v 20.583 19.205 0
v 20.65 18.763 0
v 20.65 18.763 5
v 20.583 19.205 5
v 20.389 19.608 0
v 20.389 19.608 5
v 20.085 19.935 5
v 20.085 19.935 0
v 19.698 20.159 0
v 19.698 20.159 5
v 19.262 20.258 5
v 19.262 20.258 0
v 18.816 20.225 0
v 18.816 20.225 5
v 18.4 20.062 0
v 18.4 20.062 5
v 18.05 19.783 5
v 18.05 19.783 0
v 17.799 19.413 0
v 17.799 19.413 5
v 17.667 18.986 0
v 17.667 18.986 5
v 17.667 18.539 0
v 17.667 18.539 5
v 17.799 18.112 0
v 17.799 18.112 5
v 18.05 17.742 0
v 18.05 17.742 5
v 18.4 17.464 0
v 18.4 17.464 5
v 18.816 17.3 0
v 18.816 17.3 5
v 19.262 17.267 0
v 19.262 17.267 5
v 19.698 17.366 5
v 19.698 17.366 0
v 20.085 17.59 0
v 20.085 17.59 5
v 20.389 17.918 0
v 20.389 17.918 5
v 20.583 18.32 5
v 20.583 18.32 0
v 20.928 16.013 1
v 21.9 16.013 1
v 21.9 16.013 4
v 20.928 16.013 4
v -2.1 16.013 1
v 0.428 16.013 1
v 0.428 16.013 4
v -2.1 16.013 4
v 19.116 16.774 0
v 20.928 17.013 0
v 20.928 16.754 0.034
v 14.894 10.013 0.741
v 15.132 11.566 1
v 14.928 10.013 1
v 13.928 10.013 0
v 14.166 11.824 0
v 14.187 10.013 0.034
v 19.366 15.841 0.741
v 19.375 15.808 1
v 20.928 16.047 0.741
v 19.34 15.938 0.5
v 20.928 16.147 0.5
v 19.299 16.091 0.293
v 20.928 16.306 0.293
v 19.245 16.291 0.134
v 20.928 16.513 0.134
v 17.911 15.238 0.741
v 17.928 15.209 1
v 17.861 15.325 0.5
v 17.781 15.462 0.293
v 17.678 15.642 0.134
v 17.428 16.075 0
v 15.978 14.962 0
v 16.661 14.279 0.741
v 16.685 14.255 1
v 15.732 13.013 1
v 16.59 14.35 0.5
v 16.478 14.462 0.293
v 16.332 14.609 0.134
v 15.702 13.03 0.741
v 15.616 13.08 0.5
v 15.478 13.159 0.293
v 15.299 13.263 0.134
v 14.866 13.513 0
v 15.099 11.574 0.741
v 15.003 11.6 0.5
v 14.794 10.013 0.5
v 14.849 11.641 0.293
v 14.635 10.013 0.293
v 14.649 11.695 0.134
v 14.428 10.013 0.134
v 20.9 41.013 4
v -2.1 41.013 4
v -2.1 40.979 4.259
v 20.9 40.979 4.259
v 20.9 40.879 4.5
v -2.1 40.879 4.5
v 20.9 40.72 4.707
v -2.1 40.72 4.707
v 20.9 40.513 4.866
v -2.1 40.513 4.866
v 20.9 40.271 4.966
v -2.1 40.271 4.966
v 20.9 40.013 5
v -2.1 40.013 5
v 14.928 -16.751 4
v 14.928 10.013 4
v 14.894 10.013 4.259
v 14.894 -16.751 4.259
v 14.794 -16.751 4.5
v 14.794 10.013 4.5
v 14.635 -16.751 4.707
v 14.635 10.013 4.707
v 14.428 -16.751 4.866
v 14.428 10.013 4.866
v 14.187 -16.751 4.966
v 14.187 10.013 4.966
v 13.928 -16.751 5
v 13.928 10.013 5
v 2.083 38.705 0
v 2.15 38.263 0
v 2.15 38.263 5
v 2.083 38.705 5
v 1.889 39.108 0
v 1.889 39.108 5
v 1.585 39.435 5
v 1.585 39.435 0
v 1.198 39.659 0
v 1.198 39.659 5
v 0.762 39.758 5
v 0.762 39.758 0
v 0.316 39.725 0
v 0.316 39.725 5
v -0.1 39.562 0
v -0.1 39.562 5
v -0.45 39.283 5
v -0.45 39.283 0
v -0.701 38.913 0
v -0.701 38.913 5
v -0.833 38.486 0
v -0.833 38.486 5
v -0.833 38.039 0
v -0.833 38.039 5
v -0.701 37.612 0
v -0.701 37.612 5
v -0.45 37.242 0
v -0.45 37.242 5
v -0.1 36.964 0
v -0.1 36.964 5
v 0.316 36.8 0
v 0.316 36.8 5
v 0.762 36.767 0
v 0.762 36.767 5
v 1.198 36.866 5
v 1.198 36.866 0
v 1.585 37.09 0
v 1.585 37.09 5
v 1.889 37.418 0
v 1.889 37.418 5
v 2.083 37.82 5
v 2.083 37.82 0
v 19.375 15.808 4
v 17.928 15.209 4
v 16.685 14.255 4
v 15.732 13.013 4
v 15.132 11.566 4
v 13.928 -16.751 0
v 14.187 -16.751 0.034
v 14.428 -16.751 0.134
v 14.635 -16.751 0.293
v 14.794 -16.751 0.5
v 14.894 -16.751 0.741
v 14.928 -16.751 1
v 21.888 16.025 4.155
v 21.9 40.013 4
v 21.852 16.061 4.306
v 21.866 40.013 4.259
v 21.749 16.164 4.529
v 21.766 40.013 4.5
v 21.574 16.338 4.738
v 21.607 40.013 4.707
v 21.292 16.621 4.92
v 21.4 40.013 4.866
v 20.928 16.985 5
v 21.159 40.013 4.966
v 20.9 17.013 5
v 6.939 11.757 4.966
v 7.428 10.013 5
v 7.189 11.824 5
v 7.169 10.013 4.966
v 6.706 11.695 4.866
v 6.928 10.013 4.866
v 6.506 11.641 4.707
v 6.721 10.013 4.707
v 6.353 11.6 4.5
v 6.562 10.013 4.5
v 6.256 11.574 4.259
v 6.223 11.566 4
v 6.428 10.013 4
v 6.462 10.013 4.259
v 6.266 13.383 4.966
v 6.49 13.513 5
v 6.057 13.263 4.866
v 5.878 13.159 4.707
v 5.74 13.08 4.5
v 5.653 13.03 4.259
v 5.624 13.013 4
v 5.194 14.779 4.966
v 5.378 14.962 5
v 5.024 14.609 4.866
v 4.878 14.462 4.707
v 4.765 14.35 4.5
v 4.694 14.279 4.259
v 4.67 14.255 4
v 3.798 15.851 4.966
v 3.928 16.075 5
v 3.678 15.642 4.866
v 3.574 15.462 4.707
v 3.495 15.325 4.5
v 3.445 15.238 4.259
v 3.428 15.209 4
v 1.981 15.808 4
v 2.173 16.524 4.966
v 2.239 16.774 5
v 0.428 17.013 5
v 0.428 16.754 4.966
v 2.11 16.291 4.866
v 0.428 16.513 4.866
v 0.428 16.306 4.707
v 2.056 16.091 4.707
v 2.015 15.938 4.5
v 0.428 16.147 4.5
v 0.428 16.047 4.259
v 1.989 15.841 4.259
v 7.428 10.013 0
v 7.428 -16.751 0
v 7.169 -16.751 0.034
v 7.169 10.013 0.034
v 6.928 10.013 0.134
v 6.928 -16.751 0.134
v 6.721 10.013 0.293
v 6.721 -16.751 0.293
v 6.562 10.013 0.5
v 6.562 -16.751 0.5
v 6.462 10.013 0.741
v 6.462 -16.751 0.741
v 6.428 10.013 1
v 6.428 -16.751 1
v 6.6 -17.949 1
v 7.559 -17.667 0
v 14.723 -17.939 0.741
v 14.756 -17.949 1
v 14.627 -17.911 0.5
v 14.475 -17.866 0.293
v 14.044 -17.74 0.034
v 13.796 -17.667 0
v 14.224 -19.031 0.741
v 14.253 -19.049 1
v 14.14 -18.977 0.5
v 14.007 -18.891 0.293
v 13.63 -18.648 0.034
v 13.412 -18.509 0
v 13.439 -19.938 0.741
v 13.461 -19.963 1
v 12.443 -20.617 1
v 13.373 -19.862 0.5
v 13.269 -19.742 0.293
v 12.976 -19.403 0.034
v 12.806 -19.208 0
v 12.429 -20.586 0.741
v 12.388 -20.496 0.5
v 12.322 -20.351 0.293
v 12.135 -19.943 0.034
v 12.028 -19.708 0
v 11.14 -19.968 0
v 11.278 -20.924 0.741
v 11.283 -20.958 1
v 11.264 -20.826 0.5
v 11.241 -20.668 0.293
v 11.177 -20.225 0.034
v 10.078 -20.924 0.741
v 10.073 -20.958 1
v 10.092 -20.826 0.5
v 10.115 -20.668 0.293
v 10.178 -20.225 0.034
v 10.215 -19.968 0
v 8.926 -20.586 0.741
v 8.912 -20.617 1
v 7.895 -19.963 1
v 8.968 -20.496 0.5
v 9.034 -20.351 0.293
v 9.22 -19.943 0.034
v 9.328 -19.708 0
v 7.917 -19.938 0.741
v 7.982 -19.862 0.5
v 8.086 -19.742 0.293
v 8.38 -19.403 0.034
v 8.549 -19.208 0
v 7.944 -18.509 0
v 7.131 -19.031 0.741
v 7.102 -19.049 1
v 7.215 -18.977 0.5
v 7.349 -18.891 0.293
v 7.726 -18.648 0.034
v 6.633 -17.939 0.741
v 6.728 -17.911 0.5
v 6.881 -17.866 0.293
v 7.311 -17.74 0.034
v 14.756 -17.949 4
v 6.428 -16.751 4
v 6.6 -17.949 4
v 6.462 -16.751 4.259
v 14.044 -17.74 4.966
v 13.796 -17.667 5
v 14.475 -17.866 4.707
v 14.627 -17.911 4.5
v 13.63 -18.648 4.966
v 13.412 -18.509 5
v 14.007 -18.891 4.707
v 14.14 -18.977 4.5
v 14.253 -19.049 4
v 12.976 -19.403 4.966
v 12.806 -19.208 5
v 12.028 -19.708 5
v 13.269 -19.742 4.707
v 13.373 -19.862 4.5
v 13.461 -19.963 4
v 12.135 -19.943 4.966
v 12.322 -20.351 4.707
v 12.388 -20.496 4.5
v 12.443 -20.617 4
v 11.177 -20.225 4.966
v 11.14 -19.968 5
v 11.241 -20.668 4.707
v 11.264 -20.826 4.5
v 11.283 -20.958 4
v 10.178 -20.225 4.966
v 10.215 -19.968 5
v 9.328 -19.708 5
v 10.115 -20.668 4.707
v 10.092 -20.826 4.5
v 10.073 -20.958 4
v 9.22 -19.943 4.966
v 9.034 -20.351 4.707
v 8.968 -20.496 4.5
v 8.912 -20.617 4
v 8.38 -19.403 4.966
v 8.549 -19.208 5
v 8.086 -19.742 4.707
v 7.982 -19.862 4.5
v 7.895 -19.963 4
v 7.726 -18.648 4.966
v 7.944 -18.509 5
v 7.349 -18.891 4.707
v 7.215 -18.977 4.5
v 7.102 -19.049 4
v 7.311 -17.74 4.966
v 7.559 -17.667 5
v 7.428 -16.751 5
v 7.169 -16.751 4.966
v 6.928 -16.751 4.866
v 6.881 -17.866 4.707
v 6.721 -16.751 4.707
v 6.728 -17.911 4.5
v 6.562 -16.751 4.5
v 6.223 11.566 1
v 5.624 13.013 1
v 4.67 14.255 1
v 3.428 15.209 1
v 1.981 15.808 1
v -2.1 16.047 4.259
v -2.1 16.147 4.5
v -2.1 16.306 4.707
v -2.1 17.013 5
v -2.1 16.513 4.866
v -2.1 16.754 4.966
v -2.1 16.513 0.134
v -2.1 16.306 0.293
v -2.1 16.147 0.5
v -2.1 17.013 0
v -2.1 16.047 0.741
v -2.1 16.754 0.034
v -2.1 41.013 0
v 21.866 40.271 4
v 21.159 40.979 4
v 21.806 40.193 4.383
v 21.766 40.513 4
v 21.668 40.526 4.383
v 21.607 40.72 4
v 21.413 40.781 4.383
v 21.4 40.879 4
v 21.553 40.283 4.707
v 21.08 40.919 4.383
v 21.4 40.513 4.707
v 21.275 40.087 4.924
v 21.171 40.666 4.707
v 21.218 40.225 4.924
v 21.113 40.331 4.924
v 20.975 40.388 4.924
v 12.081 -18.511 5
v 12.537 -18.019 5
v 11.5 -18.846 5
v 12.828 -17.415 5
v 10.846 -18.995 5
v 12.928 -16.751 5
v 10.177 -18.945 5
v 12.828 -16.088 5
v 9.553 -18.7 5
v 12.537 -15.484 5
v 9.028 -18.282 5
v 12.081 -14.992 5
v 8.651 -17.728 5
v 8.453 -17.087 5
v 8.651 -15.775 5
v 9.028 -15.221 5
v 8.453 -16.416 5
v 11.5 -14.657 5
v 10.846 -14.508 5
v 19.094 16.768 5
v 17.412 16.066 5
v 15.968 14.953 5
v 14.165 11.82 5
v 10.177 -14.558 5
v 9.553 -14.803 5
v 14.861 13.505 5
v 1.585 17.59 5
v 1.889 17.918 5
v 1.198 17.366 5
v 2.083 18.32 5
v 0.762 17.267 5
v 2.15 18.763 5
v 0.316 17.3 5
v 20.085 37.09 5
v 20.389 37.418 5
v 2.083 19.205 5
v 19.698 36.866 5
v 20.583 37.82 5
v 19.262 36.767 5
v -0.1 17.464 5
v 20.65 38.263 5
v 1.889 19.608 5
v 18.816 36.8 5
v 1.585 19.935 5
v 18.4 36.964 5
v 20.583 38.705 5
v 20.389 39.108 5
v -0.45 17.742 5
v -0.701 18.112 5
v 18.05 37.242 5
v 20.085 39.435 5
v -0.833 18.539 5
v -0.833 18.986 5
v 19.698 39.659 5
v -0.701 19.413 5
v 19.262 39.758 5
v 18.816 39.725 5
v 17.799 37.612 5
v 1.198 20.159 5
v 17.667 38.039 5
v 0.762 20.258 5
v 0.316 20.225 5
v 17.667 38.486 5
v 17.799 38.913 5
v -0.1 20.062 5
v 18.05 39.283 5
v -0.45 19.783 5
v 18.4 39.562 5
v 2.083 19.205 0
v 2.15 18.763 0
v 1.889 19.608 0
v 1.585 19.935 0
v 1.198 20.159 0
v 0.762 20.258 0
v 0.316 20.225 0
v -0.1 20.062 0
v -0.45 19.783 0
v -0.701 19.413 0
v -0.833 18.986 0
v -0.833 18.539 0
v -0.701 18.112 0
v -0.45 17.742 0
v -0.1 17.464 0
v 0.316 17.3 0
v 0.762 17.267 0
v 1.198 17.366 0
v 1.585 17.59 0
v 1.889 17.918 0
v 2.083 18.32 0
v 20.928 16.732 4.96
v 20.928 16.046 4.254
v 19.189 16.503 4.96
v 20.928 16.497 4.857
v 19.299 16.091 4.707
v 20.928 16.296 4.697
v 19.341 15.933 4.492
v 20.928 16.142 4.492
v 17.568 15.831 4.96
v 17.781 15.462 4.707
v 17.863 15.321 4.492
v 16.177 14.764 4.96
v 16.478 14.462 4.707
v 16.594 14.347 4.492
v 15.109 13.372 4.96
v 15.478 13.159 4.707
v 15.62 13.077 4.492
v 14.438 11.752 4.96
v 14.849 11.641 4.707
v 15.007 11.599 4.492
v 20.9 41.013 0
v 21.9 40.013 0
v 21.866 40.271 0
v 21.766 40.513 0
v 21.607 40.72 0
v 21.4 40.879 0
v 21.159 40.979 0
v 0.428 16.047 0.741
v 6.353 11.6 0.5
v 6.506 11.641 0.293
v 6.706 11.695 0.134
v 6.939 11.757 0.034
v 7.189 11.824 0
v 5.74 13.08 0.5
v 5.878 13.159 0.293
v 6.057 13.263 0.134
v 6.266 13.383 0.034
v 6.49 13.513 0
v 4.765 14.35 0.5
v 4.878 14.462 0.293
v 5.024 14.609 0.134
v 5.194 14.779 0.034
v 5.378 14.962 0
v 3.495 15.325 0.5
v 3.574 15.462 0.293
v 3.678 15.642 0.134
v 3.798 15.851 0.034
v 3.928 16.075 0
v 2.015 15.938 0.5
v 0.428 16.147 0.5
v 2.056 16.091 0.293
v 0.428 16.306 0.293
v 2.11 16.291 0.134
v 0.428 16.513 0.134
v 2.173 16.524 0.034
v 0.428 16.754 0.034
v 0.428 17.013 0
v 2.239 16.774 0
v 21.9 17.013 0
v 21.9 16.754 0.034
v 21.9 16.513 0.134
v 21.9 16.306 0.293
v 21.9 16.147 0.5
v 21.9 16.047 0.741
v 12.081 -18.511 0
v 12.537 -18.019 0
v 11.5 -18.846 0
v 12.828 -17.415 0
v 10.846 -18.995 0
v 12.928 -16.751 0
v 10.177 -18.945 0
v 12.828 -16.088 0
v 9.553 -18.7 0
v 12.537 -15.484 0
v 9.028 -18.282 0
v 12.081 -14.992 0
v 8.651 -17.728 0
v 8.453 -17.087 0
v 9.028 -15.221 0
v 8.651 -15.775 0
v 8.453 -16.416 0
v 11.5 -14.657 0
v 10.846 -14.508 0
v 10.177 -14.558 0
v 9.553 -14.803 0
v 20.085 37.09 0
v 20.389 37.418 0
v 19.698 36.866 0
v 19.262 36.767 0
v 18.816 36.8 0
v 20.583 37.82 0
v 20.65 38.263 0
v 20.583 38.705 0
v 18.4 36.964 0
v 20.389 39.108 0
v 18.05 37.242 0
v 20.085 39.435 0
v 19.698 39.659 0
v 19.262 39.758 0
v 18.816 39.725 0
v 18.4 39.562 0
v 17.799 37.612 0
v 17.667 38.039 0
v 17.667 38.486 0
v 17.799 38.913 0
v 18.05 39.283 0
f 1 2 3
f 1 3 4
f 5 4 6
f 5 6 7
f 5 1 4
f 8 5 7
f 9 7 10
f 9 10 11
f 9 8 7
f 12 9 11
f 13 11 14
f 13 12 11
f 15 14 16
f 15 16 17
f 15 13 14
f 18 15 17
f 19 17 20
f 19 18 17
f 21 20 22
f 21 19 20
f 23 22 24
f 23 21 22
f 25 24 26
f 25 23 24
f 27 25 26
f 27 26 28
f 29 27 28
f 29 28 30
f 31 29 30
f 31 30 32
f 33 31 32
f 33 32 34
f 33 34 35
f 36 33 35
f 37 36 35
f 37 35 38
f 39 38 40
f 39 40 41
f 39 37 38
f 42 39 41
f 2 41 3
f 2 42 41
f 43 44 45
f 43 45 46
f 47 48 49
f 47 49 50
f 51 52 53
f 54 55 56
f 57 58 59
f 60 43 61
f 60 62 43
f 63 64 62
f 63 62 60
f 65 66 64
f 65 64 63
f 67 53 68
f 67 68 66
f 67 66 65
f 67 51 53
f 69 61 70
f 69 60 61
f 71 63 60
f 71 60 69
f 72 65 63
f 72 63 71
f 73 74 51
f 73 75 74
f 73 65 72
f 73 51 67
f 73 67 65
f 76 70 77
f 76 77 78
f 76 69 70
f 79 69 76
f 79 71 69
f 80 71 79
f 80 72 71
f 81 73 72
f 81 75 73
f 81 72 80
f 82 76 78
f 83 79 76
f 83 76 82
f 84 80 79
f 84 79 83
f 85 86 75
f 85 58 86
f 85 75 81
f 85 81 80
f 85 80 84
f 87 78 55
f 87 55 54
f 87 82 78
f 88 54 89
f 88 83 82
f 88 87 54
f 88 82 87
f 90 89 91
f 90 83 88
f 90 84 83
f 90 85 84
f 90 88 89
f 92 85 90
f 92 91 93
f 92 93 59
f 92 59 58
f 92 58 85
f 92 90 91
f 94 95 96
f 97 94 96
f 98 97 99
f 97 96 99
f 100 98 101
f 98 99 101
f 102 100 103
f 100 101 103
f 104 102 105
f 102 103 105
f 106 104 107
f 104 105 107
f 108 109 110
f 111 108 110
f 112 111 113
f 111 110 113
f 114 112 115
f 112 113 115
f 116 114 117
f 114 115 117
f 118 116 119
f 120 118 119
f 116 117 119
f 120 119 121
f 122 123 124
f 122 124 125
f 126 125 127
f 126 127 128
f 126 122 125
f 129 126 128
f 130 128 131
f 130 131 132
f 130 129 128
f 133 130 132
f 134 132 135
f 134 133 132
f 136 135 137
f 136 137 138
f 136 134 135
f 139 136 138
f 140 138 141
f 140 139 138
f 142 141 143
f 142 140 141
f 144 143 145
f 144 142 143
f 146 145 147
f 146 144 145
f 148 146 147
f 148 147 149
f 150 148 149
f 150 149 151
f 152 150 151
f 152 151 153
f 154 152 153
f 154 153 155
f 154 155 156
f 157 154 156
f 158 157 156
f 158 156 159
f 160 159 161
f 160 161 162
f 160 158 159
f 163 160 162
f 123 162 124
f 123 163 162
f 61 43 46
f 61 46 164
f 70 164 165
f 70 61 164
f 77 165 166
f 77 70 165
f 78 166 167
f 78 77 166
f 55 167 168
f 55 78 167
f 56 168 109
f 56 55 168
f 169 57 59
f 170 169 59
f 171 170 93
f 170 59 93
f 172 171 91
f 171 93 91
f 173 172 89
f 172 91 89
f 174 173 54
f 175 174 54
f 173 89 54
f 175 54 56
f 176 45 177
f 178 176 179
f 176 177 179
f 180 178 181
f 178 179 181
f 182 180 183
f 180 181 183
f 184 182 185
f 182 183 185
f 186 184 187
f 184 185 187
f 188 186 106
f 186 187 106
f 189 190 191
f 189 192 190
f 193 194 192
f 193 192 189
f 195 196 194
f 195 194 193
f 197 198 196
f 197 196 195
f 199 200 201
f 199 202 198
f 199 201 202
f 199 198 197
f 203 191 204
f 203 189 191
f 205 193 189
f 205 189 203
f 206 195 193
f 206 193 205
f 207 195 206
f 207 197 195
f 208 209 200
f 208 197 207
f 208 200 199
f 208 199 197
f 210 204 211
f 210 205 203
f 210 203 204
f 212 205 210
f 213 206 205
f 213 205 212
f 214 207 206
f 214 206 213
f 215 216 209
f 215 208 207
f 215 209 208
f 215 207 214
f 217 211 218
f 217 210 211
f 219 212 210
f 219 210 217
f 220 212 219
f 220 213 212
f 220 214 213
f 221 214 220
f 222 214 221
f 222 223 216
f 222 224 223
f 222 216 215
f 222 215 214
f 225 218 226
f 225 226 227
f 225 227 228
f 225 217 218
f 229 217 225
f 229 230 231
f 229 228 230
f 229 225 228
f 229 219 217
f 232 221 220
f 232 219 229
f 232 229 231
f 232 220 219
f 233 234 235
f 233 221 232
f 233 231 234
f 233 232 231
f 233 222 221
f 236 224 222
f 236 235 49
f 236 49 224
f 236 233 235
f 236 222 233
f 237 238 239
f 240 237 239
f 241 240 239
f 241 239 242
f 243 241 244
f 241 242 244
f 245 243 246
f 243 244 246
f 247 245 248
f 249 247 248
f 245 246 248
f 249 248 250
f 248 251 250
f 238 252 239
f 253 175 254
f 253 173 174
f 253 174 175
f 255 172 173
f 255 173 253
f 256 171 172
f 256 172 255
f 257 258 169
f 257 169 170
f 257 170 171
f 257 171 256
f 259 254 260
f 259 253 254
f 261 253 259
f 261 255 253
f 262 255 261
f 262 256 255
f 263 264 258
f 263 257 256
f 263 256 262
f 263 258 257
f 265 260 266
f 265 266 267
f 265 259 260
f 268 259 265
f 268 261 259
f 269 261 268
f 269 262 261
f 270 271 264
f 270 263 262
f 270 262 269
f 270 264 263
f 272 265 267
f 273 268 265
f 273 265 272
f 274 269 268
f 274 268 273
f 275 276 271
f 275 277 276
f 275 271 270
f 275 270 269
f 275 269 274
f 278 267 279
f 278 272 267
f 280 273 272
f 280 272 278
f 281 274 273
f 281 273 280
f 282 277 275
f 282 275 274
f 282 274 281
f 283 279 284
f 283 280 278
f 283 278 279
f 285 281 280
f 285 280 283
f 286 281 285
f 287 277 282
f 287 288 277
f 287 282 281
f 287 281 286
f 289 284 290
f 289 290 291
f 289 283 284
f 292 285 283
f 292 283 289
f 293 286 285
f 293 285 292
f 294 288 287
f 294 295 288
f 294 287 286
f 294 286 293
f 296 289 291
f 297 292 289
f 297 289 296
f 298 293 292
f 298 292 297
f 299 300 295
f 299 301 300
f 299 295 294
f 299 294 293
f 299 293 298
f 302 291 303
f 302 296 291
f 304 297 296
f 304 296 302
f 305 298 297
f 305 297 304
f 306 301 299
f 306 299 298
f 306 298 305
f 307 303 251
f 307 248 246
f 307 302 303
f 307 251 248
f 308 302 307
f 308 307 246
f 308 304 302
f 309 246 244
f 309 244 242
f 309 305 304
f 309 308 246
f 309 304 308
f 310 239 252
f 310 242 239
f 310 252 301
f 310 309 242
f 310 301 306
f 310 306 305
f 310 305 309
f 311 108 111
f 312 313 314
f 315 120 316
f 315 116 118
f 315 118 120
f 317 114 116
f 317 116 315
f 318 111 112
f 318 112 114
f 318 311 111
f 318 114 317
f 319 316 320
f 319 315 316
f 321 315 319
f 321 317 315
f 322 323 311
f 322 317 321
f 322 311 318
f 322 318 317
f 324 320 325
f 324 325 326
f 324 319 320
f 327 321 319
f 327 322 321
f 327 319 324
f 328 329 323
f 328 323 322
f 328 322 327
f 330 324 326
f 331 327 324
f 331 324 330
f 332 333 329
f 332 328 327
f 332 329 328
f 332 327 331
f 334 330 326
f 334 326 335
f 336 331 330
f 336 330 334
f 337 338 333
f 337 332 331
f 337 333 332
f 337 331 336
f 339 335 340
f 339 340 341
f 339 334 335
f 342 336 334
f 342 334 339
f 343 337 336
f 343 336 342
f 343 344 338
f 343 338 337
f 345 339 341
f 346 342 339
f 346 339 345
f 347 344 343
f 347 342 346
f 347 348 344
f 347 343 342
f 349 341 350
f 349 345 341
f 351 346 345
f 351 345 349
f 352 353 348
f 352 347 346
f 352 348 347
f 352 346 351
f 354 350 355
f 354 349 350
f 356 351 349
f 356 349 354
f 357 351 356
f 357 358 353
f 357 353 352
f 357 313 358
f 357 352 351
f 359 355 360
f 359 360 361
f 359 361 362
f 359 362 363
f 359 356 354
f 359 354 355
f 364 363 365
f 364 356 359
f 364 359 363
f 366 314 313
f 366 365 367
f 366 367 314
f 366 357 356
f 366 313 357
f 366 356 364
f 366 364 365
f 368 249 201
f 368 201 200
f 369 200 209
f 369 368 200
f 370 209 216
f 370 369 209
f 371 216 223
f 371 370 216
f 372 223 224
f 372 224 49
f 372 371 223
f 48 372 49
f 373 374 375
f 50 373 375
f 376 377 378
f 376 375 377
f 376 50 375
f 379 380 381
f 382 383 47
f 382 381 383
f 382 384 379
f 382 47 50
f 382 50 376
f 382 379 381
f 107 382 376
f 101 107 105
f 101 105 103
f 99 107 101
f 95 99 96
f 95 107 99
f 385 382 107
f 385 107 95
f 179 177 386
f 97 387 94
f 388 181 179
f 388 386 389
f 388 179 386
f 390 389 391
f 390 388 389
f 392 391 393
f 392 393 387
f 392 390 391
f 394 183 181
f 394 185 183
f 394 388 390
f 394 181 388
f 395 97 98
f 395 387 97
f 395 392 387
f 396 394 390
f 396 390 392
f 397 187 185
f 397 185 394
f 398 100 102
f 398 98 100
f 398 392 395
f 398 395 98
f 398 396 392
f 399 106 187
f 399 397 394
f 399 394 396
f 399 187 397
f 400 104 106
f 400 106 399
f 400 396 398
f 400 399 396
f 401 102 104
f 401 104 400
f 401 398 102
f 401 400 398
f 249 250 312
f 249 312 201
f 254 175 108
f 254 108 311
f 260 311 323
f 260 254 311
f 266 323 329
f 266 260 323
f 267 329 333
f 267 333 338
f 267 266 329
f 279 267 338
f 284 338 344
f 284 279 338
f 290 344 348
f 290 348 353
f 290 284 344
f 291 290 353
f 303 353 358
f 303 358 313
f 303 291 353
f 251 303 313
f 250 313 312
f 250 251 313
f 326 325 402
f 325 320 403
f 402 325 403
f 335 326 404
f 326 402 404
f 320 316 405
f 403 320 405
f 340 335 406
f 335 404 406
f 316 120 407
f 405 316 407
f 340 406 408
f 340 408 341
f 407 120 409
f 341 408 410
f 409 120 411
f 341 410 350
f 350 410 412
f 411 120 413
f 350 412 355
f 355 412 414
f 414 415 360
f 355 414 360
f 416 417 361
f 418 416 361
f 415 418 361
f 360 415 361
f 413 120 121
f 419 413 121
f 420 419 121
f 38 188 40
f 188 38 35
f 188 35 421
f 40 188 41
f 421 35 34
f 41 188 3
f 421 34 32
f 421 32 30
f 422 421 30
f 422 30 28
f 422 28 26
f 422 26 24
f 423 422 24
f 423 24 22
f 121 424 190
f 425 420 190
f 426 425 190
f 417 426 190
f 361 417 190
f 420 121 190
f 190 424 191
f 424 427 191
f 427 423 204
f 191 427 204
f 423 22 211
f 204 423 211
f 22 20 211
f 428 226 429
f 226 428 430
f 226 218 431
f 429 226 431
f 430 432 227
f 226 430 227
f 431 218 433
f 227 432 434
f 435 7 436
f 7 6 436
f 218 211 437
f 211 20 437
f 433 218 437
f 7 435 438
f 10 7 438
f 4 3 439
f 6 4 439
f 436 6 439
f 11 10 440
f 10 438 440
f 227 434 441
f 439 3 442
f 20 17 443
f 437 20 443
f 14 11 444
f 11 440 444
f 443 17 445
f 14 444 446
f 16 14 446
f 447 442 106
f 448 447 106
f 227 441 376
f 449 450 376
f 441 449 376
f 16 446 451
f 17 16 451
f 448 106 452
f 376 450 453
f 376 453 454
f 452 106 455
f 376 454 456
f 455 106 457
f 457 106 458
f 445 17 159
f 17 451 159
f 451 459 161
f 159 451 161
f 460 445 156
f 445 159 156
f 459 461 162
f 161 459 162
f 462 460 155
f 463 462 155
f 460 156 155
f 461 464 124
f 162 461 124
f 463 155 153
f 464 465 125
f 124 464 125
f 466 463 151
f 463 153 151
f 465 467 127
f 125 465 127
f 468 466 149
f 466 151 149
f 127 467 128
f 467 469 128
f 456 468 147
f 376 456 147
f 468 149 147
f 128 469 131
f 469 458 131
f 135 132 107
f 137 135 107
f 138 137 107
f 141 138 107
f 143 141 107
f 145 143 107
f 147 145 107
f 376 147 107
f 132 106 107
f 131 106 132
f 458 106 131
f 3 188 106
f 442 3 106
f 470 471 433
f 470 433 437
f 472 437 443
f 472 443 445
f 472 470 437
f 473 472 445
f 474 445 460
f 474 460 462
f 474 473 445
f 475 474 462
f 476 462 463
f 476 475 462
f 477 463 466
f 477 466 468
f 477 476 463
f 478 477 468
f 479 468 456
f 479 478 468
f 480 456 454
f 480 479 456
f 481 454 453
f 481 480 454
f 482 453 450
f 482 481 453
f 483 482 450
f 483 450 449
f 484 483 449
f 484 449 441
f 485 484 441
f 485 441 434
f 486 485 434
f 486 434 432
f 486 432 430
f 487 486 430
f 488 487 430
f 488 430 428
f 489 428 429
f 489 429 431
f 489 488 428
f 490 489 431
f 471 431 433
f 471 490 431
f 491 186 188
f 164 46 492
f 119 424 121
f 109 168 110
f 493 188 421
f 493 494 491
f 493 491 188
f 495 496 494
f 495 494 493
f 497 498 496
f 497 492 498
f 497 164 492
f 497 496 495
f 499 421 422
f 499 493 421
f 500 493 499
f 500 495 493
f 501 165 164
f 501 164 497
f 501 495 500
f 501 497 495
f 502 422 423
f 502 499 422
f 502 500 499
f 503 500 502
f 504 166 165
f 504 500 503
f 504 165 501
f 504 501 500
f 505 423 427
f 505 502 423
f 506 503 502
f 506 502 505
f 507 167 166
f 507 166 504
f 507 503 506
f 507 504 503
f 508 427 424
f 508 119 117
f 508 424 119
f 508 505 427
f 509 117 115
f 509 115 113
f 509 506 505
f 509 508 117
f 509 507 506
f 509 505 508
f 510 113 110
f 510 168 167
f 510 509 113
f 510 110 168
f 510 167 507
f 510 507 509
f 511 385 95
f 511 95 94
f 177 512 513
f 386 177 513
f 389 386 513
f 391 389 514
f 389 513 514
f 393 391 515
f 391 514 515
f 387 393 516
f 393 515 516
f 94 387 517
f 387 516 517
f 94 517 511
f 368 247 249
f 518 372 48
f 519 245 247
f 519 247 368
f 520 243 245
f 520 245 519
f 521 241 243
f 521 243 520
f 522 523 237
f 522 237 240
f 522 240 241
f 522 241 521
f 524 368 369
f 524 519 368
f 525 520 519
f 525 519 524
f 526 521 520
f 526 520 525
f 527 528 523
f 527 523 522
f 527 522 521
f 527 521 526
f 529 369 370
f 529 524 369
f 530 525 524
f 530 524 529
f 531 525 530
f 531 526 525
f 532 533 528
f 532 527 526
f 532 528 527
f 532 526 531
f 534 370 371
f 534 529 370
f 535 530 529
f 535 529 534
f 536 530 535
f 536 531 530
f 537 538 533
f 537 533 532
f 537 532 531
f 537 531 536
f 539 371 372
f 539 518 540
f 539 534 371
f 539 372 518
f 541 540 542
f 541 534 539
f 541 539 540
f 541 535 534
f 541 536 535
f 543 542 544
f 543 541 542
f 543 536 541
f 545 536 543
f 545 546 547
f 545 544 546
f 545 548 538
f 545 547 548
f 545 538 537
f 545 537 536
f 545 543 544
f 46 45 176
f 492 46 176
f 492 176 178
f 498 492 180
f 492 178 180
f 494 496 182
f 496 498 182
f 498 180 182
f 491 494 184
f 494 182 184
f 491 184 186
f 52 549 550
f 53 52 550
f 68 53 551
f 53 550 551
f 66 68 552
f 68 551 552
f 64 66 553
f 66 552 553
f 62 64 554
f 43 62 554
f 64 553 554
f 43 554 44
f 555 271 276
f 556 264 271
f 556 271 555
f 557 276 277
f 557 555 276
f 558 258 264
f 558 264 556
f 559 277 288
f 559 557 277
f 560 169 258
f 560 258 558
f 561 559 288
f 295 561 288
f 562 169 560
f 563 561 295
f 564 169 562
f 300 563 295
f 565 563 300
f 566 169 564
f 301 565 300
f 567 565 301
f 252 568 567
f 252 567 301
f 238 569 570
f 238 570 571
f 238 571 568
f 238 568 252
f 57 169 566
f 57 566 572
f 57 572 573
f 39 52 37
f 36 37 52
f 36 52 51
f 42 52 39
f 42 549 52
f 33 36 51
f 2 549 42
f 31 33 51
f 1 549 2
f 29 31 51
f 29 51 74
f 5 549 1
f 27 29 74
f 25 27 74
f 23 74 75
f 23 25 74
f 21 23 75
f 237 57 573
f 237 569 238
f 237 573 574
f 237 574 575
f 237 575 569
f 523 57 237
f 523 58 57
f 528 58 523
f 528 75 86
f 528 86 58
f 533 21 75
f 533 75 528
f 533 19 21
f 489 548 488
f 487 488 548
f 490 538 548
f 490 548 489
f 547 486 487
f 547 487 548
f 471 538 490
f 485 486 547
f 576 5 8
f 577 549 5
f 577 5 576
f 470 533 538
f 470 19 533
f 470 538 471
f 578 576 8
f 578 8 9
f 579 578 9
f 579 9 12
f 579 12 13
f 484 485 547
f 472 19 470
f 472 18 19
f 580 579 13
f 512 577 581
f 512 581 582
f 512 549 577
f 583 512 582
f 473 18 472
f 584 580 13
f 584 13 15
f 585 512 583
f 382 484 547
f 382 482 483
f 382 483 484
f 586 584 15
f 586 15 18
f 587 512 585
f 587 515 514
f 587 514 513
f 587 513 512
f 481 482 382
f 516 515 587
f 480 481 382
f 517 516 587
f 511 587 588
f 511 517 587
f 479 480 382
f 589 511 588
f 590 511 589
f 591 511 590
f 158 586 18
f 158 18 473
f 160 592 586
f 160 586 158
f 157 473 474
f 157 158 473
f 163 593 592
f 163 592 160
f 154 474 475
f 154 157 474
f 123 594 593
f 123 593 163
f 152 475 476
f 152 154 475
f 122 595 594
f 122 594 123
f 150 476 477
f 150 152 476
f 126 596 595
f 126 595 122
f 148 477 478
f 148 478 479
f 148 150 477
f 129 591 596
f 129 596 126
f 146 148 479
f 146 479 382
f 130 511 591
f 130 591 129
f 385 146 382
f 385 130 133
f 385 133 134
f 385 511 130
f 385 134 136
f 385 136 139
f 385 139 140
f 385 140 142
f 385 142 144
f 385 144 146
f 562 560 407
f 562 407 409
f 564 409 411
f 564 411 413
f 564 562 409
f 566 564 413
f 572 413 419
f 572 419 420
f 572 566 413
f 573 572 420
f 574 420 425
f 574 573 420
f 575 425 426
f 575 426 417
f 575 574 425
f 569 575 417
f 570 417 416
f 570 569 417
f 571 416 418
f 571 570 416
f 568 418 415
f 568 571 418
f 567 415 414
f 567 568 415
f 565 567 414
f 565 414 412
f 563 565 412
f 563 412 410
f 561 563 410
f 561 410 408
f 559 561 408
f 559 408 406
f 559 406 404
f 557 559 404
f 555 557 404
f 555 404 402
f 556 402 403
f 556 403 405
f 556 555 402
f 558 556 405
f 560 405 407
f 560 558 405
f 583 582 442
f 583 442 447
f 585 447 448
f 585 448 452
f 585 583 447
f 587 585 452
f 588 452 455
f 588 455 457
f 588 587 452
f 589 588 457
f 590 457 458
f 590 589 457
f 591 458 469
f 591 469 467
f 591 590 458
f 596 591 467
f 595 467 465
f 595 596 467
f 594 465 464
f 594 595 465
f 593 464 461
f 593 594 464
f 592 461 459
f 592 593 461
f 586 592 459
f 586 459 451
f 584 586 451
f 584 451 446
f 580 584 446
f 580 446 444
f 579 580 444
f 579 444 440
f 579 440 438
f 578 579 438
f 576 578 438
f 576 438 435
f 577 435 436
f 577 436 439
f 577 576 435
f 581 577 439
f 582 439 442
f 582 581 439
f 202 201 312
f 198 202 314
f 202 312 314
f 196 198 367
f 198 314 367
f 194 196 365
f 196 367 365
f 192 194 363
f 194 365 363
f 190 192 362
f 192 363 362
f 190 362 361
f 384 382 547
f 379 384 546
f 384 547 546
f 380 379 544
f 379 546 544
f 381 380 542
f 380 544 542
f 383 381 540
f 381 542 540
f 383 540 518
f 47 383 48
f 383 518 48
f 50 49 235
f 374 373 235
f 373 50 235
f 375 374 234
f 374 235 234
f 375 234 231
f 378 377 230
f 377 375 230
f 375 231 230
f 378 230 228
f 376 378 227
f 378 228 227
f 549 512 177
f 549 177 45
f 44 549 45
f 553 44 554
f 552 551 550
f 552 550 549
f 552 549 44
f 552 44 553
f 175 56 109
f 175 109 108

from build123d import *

# Parameters (mm, degrees)
CROQUIS1_R              = 2.2500000000000027
CROQUIS1_R_2            = 1.5000000000000013
CROQUIS1_R_3            = 1.5000000000000009
CROQUIS1_R_4            = 1.4999999999999967
SALIENTE_EXTRUIR1_DEPTH = 5
REDONDEO1_R             = 1


with BuildPart() as part:
    # Croquis1 → Saliente-Extruir1 (new body)
    with BuildSketch(Plane.XY):
        with BuildLine():
            Line((-2.100000000000147, 41.01261693614467), (21.89999999999985, 41.01261693614466))
            Line((21.89999999999985, 41.01261693614466), (21.89999999999985, 16.01261693614466))
            Line((21.89999999999985, 16.01261693614466), (20.92776114455846, 16.01261693614466))
            ThreePointArc((20.92776114455846, 16.01261693614466), (16.68512045743913, 14.255257623263944), (14.927761144558415, 10.012616936144616))
            Line((14.927761144558415, 10.012616936144616), (14.927761144558415, -16.751467205989318))
            ThreePointArc((14.927761144558415, -16.751467205989318), (10.677761144558414, -21.001467205989325), (6.427761144558411, -16.751467205989318))
            Line((6.427761144558411, -16.751467205989318), (6.427761144558411, 10.012616936144616))
            ThreePointArc((6.427761144558411, 10.012616936144616), (4.670401831677697, 14.255257623263944), (0.42776114455836833, 16.01261693614466))
            Line((0.42776114455836833, 16.01261693614466), (-2.100000000000148, 16.01261693614466))
            Line((-2.100000000000148, 16.01261693614466), (-2.100000000000147, 41.01261693614467))
        make_face()
        with Locations((10.677761144558414, -16.751467205989318)):
            Circle(CROQUIS1_R, mode=Mode.SUBTRACT)
        with Locations((0.6499999999998556, 38.26261693614465)):
            Circle(CROQUIS1_R_2, mode=Mode.SUBTRACT)
        with Locations((19.1499999999999, 38.26261693614465)):
            Circle(CROQUIS1_R_3, mode=Mode.SUBTRACT)
        with Locations((19.1499999999999, 18.76261693614465)):
            Circle(CROQUIS1_R_4, mode=Mode.SUBTRACT)
        with Locations((0.6499999999998556, 18.76261693614465)):
            Circle(CROQUIS1_R_2, mode=Mode.SUBTRACT)
    extrude(amount=SALIENTE_EXTRUIR1_DEPTH)

    # Redondeo1
    # the kernel refuses this fillet: 1 mm, written as the material it takes off along each edge
    with BuildSketch(Plane(origin=(20.89999999999985, 40.01261693614466, 4), x_dir=(3e-16, 1, 0), z_dir=(0, 0, 1))) as redondeo1_piece_1_section:
        Polygon((0, 0), (REDONDEO1_R, 0), (REDONDEO1_R, -REDONDEO1_R), (3e-16, -REDONDEO1_R), align=None)
    redondeo1_piece_1 = extrude(amount=REDONDEO1_R, mode=Mode.PRIVATE)
    redondeo1_piece_1 = redondeo1_piece_1 - Plane(origin=(20.89999999999985, 40.01261693614466, 4), x_dir=(-0.7071067811865477, -0.7071067811865475, 0), z_dir=(0, 0, 1)) * Sphere(REDONDEO1_R, mode=Mode.PRIVATE)
    add(redondeo1_piece_1, mode=Mode.SUBTRACT)
    with BuildSketch(Plane(origin=(0.42776114455836833, 16.01261693614466, 0), x_dir=(0, 0, 1), z_dir=(-1, 0, 0))) as redondeo1_piece_2:
        with BuildLine():
            CenterArc((REDONDEO1_R, REDONDEO1_R), REDONDEO1_R, 180, 90)
            Line((-1.1e-16, REDONDEO1_R), (0, 0))
            Line((0, 0), (REDONDEO1_R, 0))
        make_face()
    extrude(amount=5.027761144558516, mode=Mode.SUBTRACT)
    with BuildSketch(Plane(origin=(24.39999999999985, 16.01261693614466, 0), x_dir=(0, 0, 1), z_dir=(-1, 0, 0))) as redondeo1_piece_3:
        with BuildLine():
            CenterArc((REDONDEO1_R, REDONDEO1_R), REDONDEO1_R, 180, 90)
            Line((-1.1e-16, REDONDEO1_R), (0, 0))
            Line((0, 0), (REDONDEO1_R, 0))
        make_face()
    extrude(amount=3.4722388554413897, mode=Mode.SUBTRACT)
    with BuildSketch(Plane(origin=(20.927761144558417, 10.012616936144658, 0), x_dir=(7.11e-15, 1, 0), z_dir=(1, -7.11e-15, 0))) as redondeo1_piece_4:
        with BuildLine():
            CenterArc((6.000000000000002 + REDONDEO1_R, REDONDEO1_R), REDONDEO1_R, 180, 90)
            Line((6.000000000000002 + REDONDEO1_R, -1.1e-16), (6.000000000000002, 0))
            Line((6.000000000000002, 0), (6.000000000000002, REDONDEO1_R))
        make_face()
    revolve(axis=Axis((20.927761144558417, 10.012616936144658, 0), (0, 0, 1)), revolution_arc=90.00000000000081, mode=Mode.SUBTRACT)
    with BuildSketch(Plane(origin=(14.927761144558415, 10.012616936144616, 0), x_dir=(0, 0, 1), z_dir=(0, -1, 0))) as redondeo1_piece_5:
        with BuildLine():
            CenterArc((REDONDEO1_R, REDONDEO1_R), REDONDEO1_R, 180, 90)
            Line((-1.1e-16, REDONDEO1_R), (0, 0))
            Line((0, 0), (REDONDEO1_R, 0))
        make_face()
    extrude(amount=26.76408414213393, mode=Mode.SUBTRACT)
    with BuildSketch(Plane(origin=(10.677761144558414, -16.75146720598932, 0), x_dir=(1, 8.4e-16, 0), z_dir=(-8.4e-16, 1, 0))) as redondeo1_piece_6:
        with BuildLine():
            CenterArc((4.2500000000000036 - REDONDEO1_R, -REDONDEO1_R), REDONDEO1_R, 0, 90)
            Line((4.2500000000000036 - REDONDEO1_R, 1.1e-16), (4.2500000000000036, 0))
            Line((4.2500000000000036, 0), (4.2500000000000036, -REDONDEO1_R))
        make_face()
    revolve(axis=Axis((10.677761144558414, -16.75146720598932, 0), (0, 0, -1)), revolution_arc=180.0000000000001, mode=Mode.SUBTRACT)
    with BuildSketch(Plane(origin=(6.427761144558411, -16.751467205989318, 0), x_dir=(0, 0, 1), z_dir=(0, 1, 0))) as redondeo1_piece_7:
        with BuildLine():
            CenterArc((REDONDEO1_R, REDONDEO1_R), REDONDEO1_R, 180, 90)
            Line((-1.1e-16, REDONDEO1_R), (0, 0))
            Line((0, 0), (REDONDEO1_R, 0))
        make_face()
    extrude(amount=26.76408414213393, mode=Mode.SUBTRACT)
    with BuildSketch(Plane(origin=(0.42776114455836833, 16.01261693614466, 5), x_dir=(0, 0, -1), z_dir=(-1, 0, 0))) as redondeo1_piece_8:
        with BuildLine():
            CenterArc((REDONDEO1_R, -REDONDEO1_R), REDONDEO1_R, 90, 90)
            Line((0, -REDONDEO1_R), (0, 0))
            Line((0, 0), (REDONDEO1_R, 0))
        make_face()
    extrude(amount=5.027761144558516, mode=Mode.SUBTRACT)
    with BuildSketch(Plane(origin=(0.4277611445584084, 10.012616936144658, 5), x_dir=(1, -7.11e-15, 0), z_dir=(-7.11e-15, -1, 0))) as redondeo1_piece_9:
        with BuildLine():
            CenterArc((6.000000000000003 + REDONDEO1_R, -REDONDEO1_R), REDONDEO1_R, 90, 90)
            Line((6.000000000000003 + REDONDEO1_R, 0), (6.000000000000003, 0))
            Line((6.000000000000003, 0), (6.000000000000003, -REDONDEO1_R))
        make_face()
    revolve(axis=Axis((0.4277611445584084, 10.012616936144658, 5), (0, 0, 1)), revolution_arc=90.00000000000078, mode=Mode.SUBTRACT)
    with BuildSketch(Plane(origin=(20.927761144558417, 10.012616936144658, 5), x_dir=(7.11e-15, 1, 0), z_dir=(1, -7.11e-15, 0))) as redondeo1_piece_10:
        with BuildLine():
            CenterArc((6.000000000000002 + REDONDEO1_R, -REDONDEO1_R), REDONDEO1_R, 90, 90)
            Line((6.000000000000002 + REDONDEO1_R, 0), (6.000000000000002, 0))
            Line((6.000000000000002, 0), (6.000000000000002, -REDONDEO1_R))
        make_face()
    revolve(axis=Axis((20.927761144558417, 10.012616936144658, 5), (0, 0, 1)), revolution_arc=90.00000000000081, mode=Mode.SUBTRACT)
    with BuildSketch(Plane(origin=(14.927761144558415, 10.012616936144616, 5), x_dir=(0, 0, -1), z_dir=(0, -1, 0))) as redondeo1_piece_11:
        with BuildLine():
            CenterArc((REDONDEO1_R, -REDONDEO1_R), REDONDEO1_R, 90, 90)
            Line((0, -REDONDEO1_R), (0, 0))
            Line((0, 0), (REDONDEO1_R, 0))
        make_face()
    extrude(amount=26.76408414213393, mode=Mode.SUBTRACT)
    with BuildSketch(Plane(origin=(10.677761144558414, -16.75146720598932, 5), x_dir=(1, 8.4e-16, 0), z_dir=(-8.4e-16, 1, 0))) as redondeo1_piece_12:
        with BuildLine():
            CenterArc((4.2500000000000036 - REDONDEO1_R, REDONDEO1_R), REDONDEO1_R, 270, 90)
            Line((4.2500000000000036 - REDONDEO1_R, 0), (4.2500000000000036, 0))
            Line((4.2500000000000036, 0), (4.2500000000000036, REDONDEO1_R))
        make_face()
    revolve(axis=Axis((10.677761144558414, -16.75146720598932, 5), (0, 0, -1)), revolution_arc=180.0000000000001, mode=Mode.SUBTRACT)
    with BuildSketch(Plane(origin=(0.4277611445584084, 10.012616936144658, 0), x_dir=(1, -7.11e-15, 0), z_dir=(-7.11e-15, -1, 0))) as redondeo1_piece_13:
        with BuildLine():
            CenterArc((6.000000000000003 + REDONDEO1_R, REDONDEO1_R), REDONDEO1_R, 180, 90)
            Line((6.000000000000003 + REDONDEO1_R, -1.1e-16), (6.000000000000003, 0))
            Line((6.000000000000003, 0), (6.000000000000003, REDONDEO1_R))
        make_face()
    revolve(axis=Axis((0.4277611445584084, 10.012616936144658, 0), (0, 0, 1)), revolution_arc=90.00000000000078, mode=Mode.SUBTRACT)
    with BuildSketch(Plane(origin=(21.89999999999985, 41.01261693614466, -2.5), x_dir=(-1, 0, 0), z_dir=(0, 0, 1))) as redondeo1_piece_14:
        with BuildLine():
            CenterArc((REDONDEO1_R, REDONDEO1_R), REDONDEO1_R, 180, 90)
            Line((0, REDONDEO1_R), (0, 0))
            Line((0, 0), (REDONDEO1_R, 0))
        make_face()
    extrude(amount=6.5, mode=Mode.SUBTRACT)
    with BuildSketch(Plane(origin=(-4.600000000000147, 41.01261693614467, 5), x_dir=(0, 0, -1), z_dir=(1, -3e-16, 0))) as redondeo1_piece_15:
        with BuildLine():
            CenterArc((REDONDEO1_R, -REDONDEO1_R), REDONDEO1_R, 90, 90)
            Line((0, -REDONDEO1_R), (0, 0))
            Line((0, 0), (REDONDEO1_R, 0))
        make_face()
    extrude(amount=25.499999999999996, mode=Mode.SUBTRACT)
    with BuildSketch(Plane(origin=(21.89999999999985, 40.01261693614466, 5), x_dir=(0, 0, -1), z_dir=(0, -1, 0))) as redondeo1_piece_16:
        with BuildLine():
            CenterArc((REDONDEO1_R, -REDONDEO1_R), REDONDEO1_R, 90, 90)
            Line((0, -REDONDEO1_R), (0, 0))
            Line((0, 0), (REDONDEO1_R, 0))
        make_face()
    extrude(amount=26.500000000000004, mode=Mode.SUBTRACT)
    with BuildSketch(Plane(origin=(6.427761144558411, -16.751467205989318, 5), x_dir=(0, 0, -1), z_dir=(0, 1, 0))) as redondeo1_piece_17:
        with BuildLine():
            CenterArc((REDONDEO1_R, -REDONDEO1_R), REDONDEO1_R, 90, 90)
            Line((0, -REDONDEO1_R), (0, 0))
            Line((0, 0), (REDONDEO1_R, 0))
        make_face()
    extrude(amount=26.76408414213393, mode=Mode.SUBTRACT)
    with BuildSketch(Plane(origin=(24.39999999999985, 16.01261693614466, 5), x_dir=(0, 0, -1), z_dir=(-1, 0, 0))) as redondeo1_piece_18:
        with BuildLine():
            CenterArc((REDONDEO1_R, -REDONDEO1_R), REDONDEO1_R, 90, 90)
            Line((0, -REDONDEO1_R), (0, 0))
            Line((0, 0), (REDONDEO1_R, 0))
        make_face()
    extrude(amount=3.4722388554413897, mode=Mode.SUBTRACT)


solid = part.part
